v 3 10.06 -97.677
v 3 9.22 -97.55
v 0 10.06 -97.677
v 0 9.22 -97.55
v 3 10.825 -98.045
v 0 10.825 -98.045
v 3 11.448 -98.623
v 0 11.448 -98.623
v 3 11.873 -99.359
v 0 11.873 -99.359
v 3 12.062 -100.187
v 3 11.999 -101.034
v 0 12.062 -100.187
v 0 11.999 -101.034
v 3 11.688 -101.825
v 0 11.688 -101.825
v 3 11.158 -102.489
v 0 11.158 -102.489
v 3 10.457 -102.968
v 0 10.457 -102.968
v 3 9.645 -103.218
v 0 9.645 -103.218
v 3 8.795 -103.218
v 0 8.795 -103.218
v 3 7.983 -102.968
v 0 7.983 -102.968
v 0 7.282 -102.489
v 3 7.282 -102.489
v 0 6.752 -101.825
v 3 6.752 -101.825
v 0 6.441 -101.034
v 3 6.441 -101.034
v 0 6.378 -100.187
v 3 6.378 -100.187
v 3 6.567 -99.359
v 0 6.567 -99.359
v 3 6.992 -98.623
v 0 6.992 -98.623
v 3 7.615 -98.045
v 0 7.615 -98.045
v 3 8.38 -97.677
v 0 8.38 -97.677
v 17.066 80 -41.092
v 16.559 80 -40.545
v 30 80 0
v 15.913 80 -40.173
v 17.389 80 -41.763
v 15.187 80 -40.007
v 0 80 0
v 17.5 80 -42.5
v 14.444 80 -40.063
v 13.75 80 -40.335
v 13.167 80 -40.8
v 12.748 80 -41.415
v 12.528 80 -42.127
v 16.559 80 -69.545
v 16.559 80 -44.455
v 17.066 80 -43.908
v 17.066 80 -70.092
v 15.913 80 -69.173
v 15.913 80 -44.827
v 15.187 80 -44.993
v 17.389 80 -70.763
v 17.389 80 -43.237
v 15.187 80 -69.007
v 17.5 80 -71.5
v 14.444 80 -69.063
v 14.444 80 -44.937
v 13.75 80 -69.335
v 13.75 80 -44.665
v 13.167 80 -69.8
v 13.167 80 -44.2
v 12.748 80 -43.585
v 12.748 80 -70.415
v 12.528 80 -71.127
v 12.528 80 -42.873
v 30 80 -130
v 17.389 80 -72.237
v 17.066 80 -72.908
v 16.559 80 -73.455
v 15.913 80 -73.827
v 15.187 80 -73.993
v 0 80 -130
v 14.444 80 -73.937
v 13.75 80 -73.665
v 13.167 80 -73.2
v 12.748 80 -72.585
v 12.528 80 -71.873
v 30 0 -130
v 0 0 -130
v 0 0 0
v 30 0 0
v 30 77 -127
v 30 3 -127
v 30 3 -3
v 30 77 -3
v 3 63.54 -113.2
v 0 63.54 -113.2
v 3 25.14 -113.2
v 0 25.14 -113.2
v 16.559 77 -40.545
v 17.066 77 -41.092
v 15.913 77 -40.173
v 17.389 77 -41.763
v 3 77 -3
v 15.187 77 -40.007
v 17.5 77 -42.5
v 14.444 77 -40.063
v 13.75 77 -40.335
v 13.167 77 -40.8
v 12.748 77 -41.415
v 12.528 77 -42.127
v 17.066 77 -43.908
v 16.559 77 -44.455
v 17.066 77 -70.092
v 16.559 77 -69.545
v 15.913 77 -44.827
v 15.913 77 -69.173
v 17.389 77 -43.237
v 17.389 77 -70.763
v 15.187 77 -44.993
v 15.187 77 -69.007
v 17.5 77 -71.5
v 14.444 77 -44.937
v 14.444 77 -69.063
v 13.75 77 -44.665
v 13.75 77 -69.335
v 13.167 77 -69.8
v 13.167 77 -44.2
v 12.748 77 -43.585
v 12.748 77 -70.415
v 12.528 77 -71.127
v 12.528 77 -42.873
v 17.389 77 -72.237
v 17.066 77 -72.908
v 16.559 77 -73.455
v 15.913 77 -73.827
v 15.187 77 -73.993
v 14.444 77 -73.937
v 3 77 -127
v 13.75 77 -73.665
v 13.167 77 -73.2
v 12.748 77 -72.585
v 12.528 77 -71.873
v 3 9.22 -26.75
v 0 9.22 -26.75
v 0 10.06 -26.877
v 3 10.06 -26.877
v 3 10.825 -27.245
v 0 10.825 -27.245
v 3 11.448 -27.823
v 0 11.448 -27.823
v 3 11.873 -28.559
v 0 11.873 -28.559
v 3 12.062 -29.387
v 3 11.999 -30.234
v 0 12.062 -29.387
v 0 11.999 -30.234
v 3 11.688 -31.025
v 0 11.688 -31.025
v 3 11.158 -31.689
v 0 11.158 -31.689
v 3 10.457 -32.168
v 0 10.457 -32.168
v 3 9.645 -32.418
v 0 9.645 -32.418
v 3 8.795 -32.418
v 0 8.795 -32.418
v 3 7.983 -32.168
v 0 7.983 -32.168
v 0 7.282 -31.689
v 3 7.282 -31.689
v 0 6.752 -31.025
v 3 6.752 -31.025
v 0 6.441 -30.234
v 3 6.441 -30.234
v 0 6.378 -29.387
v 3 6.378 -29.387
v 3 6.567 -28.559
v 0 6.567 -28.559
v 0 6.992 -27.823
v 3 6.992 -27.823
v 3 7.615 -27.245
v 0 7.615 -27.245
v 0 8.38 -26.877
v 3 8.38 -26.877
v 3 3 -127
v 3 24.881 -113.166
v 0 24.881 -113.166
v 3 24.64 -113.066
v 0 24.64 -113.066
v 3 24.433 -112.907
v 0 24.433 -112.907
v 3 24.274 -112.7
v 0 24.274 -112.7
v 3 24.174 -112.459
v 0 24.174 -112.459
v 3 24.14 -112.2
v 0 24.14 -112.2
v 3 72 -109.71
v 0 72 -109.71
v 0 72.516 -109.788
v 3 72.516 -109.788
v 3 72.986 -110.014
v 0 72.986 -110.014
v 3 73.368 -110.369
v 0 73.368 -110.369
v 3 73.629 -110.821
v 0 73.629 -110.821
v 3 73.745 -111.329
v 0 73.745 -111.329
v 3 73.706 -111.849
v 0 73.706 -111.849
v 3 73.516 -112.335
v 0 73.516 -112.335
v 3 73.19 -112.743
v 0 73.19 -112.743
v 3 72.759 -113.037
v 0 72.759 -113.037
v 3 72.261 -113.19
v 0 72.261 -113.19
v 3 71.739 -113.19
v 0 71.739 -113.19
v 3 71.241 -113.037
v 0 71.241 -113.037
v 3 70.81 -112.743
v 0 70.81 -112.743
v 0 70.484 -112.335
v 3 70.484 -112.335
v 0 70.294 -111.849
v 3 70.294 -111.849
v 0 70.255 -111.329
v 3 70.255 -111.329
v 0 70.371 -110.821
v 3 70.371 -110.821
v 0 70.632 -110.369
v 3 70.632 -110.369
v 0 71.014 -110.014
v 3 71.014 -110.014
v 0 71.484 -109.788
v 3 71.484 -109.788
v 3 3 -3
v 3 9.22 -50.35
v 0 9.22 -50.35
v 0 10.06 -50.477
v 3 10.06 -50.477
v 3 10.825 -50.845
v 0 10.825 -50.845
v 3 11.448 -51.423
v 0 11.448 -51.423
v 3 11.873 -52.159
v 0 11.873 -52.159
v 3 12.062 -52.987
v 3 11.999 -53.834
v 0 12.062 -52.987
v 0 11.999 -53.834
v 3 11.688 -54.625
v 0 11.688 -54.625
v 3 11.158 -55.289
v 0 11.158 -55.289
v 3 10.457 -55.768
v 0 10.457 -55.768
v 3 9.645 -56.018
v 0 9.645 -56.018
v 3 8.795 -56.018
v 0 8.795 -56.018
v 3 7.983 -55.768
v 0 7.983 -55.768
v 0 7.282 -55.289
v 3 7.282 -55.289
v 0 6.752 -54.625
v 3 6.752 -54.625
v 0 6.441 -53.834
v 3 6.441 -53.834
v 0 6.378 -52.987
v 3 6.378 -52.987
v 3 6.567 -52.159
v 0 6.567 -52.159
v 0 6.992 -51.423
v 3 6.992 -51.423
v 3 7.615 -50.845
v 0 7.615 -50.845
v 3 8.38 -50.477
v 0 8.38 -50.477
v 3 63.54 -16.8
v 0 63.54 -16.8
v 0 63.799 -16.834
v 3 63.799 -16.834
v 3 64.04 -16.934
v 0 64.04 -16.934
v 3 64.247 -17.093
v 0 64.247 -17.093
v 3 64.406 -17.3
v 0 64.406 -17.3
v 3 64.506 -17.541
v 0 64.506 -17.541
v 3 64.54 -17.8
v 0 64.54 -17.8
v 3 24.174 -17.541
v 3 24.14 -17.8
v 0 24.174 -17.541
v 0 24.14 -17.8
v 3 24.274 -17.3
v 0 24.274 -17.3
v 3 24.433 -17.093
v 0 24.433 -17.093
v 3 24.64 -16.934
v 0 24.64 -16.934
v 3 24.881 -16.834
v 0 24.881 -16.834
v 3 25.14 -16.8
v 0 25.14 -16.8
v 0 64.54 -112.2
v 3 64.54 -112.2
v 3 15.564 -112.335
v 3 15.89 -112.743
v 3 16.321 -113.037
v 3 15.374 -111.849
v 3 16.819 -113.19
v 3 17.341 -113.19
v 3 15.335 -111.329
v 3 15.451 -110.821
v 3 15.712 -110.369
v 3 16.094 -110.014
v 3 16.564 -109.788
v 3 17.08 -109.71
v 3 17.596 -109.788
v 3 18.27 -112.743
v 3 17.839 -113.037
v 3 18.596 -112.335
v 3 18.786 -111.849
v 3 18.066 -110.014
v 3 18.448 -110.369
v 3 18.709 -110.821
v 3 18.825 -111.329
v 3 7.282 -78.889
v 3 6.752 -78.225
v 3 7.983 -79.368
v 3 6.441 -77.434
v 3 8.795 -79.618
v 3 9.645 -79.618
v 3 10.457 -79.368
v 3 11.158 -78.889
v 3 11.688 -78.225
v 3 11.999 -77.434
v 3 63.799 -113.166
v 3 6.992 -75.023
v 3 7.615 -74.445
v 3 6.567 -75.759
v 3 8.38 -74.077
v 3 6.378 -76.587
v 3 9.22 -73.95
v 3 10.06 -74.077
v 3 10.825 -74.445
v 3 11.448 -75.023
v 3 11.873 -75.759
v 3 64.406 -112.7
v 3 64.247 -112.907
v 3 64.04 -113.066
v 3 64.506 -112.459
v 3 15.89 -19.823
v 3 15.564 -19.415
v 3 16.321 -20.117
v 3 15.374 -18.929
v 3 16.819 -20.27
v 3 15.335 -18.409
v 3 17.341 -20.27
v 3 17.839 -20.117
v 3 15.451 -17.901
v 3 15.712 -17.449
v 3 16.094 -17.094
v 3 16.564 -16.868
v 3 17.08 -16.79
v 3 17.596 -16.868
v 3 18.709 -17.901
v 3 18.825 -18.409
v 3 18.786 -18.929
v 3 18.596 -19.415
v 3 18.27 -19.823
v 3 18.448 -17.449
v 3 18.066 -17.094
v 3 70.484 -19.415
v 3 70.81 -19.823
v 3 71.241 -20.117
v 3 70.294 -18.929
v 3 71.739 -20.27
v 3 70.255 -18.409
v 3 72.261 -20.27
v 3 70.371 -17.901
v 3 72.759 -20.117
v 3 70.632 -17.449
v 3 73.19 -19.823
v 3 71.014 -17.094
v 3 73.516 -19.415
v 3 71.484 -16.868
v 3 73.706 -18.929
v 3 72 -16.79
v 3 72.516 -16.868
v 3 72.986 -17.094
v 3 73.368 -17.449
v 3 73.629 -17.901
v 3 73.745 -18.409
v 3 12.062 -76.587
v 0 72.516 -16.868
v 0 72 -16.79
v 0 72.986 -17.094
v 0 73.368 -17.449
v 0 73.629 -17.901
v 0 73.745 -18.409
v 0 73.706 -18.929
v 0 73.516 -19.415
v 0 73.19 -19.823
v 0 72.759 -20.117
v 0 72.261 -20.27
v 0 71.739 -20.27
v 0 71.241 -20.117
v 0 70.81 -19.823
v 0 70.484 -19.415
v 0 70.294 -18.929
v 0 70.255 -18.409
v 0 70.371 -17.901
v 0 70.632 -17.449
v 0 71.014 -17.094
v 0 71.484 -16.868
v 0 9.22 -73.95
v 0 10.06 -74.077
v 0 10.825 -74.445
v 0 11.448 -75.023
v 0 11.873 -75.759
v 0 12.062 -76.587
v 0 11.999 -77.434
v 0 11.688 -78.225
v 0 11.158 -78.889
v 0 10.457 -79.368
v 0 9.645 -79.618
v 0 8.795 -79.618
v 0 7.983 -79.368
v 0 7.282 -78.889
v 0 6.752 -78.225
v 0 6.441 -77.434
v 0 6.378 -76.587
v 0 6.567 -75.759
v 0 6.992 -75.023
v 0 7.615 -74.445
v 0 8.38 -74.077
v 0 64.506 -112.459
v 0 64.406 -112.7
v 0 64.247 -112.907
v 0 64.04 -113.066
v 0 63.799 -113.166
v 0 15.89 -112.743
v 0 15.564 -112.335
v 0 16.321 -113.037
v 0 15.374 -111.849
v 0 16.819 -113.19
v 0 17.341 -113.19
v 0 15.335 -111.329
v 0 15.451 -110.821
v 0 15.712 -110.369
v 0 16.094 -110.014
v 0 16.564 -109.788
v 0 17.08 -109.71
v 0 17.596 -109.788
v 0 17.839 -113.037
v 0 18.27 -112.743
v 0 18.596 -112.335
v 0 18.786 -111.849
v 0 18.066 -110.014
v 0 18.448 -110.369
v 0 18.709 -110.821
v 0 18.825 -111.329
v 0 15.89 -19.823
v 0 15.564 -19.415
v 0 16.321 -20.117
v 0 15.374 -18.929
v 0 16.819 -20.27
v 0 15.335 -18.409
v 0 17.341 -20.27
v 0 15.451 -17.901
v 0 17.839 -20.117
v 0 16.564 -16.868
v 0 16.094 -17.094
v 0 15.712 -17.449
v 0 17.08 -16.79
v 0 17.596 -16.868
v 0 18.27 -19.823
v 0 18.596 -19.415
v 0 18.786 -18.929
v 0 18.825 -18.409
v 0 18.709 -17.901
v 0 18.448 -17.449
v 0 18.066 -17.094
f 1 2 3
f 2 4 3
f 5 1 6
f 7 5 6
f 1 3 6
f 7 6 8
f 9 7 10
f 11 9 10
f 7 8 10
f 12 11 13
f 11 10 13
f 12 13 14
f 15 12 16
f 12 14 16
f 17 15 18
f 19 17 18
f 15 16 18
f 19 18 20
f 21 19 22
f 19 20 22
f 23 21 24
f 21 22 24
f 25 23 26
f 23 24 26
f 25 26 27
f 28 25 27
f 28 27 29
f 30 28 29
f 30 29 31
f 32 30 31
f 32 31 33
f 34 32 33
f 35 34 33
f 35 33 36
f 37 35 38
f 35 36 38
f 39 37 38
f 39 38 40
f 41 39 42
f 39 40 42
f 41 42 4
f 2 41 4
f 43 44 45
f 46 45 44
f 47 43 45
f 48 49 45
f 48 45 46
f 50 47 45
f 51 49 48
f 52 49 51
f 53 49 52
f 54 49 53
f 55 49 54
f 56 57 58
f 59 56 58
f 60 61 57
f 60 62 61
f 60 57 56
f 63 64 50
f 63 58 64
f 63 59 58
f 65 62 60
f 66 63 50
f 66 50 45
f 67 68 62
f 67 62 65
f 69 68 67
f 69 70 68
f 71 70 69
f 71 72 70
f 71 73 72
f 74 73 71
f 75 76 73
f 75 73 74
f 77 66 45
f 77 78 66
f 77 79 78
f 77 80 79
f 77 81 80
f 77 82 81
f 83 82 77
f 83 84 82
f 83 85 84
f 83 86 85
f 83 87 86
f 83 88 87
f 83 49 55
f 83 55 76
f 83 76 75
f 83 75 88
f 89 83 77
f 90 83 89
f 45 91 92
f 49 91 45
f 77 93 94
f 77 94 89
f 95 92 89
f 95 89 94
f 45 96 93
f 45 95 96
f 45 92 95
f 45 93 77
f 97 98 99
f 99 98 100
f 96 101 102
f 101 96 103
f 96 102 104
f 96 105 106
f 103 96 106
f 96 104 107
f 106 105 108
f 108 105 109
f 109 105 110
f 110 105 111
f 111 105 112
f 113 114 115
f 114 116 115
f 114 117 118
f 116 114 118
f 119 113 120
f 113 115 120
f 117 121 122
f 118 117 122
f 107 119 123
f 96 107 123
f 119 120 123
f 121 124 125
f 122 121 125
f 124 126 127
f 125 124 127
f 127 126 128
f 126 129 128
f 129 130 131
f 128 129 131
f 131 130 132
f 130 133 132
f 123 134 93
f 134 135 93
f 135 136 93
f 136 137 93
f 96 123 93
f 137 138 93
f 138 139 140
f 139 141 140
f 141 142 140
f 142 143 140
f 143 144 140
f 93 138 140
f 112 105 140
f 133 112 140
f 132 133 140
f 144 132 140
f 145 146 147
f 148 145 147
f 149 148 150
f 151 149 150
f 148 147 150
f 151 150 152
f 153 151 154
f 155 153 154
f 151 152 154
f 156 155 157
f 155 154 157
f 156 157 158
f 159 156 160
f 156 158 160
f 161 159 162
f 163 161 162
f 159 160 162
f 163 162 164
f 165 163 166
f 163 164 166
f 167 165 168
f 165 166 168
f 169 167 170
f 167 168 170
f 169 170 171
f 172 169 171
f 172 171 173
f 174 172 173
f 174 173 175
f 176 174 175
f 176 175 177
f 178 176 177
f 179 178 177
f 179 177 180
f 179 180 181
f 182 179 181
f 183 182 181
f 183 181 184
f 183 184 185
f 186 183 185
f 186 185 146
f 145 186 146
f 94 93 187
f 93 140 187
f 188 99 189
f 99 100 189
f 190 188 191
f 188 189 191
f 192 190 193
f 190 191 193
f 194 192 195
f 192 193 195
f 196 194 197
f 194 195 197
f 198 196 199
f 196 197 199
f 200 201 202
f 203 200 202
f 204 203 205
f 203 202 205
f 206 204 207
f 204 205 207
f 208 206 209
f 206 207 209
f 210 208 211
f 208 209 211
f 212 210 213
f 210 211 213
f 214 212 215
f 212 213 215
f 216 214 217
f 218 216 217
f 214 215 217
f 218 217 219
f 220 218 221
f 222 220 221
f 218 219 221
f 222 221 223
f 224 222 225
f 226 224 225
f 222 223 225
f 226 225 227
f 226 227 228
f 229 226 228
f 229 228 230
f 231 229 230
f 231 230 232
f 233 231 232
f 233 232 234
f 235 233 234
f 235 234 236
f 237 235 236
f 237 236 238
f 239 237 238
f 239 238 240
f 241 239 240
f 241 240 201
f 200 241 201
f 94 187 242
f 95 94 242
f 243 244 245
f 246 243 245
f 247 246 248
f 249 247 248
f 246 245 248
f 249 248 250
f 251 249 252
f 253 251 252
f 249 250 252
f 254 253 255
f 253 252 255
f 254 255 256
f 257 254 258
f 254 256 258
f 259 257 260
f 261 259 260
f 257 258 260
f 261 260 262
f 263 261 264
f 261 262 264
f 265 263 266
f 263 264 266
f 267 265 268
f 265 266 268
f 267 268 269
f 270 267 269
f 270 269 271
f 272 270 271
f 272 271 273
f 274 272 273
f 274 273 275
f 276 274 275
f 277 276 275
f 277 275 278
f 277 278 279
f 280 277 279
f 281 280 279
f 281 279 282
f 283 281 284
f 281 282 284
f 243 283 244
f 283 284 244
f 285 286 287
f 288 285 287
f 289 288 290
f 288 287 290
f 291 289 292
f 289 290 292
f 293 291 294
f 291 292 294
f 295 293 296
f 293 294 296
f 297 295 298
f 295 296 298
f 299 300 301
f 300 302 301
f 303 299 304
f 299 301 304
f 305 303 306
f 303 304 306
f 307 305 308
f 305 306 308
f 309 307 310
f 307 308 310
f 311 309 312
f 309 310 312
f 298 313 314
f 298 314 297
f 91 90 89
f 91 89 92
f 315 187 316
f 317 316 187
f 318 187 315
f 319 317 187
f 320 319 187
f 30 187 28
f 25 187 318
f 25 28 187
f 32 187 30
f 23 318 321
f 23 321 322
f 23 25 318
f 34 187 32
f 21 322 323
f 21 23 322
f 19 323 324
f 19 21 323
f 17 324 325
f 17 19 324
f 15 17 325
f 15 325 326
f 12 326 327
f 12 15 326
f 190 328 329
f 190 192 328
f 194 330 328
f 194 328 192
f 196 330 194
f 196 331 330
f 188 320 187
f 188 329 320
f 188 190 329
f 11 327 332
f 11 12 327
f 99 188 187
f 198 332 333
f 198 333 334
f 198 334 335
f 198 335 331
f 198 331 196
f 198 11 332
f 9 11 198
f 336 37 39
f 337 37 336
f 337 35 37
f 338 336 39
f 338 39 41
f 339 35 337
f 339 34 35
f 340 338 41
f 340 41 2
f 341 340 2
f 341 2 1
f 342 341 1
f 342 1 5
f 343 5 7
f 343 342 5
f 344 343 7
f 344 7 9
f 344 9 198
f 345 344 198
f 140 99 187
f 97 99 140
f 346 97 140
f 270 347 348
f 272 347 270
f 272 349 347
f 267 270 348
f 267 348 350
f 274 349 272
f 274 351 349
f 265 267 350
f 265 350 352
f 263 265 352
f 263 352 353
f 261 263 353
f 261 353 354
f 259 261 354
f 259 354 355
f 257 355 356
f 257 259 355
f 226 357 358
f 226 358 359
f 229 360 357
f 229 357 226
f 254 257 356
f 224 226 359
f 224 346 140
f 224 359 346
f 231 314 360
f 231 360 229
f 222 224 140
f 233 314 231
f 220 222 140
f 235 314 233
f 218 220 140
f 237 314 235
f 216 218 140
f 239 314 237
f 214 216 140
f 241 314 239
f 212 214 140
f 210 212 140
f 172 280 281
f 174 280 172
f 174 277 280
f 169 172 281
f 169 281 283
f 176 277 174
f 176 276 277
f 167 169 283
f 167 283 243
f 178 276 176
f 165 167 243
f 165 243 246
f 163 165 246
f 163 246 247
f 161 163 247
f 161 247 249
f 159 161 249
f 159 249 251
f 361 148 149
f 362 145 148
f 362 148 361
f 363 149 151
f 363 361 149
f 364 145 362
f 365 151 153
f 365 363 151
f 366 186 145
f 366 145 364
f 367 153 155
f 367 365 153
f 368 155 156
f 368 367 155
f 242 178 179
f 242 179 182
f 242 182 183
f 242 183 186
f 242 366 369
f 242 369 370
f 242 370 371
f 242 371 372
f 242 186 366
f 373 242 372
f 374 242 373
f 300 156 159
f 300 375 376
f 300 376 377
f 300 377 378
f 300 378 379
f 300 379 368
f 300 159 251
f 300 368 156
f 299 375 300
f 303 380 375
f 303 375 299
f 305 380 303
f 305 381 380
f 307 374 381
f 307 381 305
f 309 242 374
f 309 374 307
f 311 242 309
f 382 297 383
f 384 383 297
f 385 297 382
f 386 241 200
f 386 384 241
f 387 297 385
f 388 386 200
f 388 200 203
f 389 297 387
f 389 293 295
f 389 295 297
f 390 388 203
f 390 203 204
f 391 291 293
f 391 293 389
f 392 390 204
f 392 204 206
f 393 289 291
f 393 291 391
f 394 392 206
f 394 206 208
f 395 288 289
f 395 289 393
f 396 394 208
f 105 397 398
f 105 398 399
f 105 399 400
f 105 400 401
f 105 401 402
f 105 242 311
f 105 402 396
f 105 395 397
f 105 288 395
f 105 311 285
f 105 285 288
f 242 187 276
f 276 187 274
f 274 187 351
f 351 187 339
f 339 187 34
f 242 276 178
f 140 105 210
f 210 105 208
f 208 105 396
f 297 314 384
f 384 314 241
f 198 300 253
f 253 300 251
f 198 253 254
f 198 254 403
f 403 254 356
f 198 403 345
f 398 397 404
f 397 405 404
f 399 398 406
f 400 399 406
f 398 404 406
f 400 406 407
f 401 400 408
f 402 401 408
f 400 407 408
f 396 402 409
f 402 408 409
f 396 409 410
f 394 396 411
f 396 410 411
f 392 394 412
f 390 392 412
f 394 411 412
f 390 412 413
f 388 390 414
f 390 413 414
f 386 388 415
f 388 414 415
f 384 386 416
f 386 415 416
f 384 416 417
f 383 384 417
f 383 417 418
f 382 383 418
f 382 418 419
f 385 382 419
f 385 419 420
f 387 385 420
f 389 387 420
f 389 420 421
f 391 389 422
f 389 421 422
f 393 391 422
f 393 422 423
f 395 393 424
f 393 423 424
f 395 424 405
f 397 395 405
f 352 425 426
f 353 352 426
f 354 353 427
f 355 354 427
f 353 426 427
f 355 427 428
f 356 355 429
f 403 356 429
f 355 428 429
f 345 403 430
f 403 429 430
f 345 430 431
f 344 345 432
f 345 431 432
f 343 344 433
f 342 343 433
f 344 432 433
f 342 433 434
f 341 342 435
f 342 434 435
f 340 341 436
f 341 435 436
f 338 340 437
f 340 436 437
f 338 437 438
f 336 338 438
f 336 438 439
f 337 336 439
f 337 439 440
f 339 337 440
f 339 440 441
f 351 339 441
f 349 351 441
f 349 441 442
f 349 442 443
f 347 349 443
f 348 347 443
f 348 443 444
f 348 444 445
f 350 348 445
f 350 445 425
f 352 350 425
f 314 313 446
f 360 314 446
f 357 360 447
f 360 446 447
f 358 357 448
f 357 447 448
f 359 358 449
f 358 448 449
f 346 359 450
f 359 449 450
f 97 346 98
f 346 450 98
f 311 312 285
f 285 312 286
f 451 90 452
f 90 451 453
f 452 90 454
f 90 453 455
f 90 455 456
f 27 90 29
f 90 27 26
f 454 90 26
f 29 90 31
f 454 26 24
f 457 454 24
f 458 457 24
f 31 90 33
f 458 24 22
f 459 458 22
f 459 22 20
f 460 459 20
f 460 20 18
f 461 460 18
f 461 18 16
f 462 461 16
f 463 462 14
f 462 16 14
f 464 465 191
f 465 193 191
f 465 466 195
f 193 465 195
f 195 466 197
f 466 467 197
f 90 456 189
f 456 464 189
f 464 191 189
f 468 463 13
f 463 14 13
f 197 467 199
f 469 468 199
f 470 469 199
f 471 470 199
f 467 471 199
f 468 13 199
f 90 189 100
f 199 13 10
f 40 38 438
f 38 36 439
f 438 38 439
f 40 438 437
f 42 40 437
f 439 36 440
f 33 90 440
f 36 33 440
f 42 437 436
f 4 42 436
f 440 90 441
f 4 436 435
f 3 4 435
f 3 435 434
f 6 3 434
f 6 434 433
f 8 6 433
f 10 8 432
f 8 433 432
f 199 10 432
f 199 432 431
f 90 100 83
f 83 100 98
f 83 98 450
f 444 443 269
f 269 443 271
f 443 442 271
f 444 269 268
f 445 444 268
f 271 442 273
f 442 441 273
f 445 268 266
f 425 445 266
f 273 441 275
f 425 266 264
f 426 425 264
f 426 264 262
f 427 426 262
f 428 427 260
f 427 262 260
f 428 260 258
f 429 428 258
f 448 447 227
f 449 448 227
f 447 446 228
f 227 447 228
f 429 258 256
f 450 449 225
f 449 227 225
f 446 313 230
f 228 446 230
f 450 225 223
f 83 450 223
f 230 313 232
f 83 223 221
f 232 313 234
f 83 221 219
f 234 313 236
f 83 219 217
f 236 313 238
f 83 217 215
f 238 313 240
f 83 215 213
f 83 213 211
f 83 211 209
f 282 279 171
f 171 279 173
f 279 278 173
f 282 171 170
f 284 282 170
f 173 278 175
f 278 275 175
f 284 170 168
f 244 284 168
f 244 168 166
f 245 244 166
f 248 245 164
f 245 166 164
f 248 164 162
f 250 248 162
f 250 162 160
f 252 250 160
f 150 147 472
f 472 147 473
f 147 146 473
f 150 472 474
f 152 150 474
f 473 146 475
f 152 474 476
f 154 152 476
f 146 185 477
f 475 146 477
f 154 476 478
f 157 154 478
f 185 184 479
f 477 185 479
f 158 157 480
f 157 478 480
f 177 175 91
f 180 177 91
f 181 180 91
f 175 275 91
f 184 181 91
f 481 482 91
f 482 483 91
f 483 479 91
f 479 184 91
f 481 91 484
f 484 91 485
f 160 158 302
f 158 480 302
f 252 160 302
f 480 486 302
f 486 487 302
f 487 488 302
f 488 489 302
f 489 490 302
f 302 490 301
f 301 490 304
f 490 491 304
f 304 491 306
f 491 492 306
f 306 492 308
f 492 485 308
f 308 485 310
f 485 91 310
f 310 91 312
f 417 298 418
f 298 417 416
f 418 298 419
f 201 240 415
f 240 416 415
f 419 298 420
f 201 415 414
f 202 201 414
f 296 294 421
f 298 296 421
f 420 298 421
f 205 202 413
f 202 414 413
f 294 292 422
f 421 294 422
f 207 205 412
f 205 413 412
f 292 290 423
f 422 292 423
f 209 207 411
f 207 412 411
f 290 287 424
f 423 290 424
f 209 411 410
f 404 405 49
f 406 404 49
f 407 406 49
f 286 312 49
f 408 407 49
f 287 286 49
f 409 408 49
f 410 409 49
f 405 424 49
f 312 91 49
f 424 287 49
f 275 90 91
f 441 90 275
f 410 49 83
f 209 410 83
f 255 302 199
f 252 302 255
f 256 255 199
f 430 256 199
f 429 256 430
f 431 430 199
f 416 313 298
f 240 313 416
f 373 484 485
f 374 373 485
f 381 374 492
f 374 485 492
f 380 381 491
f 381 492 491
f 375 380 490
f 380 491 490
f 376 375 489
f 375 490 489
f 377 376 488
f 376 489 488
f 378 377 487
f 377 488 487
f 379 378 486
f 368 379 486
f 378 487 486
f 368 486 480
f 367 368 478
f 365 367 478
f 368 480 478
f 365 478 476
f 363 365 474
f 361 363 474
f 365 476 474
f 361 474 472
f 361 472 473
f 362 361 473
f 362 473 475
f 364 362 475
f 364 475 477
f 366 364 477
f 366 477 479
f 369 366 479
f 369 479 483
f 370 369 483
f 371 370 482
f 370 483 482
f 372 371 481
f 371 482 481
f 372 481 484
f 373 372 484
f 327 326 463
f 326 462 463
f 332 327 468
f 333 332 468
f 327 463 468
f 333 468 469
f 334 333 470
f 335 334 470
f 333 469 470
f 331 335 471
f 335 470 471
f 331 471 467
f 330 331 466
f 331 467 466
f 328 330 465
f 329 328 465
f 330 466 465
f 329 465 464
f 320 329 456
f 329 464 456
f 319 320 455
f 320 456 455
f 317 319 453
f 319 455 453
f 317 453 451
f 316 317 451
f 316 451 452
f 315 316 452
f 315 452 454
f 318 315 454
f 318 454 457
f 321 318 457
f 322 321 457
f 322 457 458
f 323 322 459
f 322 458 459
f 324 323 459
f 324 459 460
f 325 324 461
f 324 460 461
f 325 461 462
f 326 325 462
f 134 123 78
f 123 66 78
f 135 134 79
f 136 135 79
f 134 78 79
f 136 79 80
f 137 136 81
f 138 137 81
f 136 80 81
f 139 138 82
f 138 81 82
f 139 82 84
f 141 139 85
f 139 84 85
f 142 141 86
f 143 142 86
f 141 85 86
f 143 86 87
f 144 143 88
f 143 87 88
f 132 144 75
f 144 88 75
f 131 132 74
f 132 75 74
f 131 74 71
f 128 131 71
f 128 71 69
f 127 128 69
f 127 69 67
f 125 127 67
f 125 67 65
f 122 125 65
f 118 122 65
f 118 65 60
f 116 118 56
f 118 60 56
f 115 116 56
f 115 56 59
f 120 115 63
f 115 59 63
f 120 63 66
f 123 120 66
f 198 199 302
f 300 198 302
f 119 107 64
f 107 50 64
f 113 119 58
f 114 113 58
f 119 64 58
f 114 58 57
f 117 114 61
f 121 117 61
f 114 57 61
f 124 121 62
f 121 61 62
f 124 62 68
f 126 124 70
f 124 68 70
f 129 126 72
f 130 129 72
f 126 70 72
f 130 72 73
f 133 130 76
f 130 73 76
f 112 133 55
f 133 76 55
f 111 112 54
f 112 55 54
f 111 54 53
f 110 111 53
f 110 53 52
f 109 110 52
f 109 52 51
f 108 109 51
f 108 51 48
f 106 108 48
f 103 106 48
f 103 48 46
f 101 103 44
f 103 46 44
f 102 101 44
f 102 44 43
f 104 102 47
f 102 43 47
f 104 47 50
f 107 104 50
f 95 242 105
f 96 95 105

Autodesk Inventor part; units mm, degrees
ref_plane "YZ Plane" through (0, 0, 0) normal (1, 0, 0) x (0, 1, 0)
ref_plane "XZ Plane" through (0, 0, 0) normal (0, 1, 0) x (-1, 0, 0)
ref_plane "XY Plane" through (0, 0, 0) normal (0, 0, 1) x (1, 0, 0)
sketch "Sketch1" plane through (0, 0, 0) normal (1, 0, 0) x (0, 1, 0)
  line L0 (0, 0) -> (80, 0)
  line L1 (80, 0) -> (80, -130)
  line L2 (80, -130) -> (0, -130)
  line L3 (0, -130) -> (0, 0)
  dimension "d0" = 130
  dimension "d1" = 80
extrude "Extrusion1" add sketch "Sketch1" along normal blind 30
shell "Shell1" thickness 3 removed faces 1 at (30, 53.3333, -43.3333)
sketch "Sketch2" plane through (0, 0, 0) normal (-1, 0, 0) x (0, 0, 1)
  line L0 (-127, 77) -> (-3, 77) projected
  line L1 (-127, 3) -> (-3, 3) projected
  line L2 (-127, 77) -> (-3, 77)
  line L3 (-3, 77) -> (-3, 3)
  line L4 (-3, 3) -> (-127, 3)
  line L5 (-127, 3) -> (-127, 77)
  line L6 (-65, 77) -> (-65, 41.725)
  line L7 (-127, 77) -> (-122, 77)
  line L8 (-122, 77) -> (-122, 72)
  line L9 (-122, 72) -> (-127, 72)
  line L10 (-127, 72) -> (-127, 77)
  line L11 (-3, 77) -> (-8, 77)
  line L12 (-8, 77) -> (-8, 72)
  line L13 (-8, 72) -> (-3, 72)
  line L14 (-3, 72) -> (-3, 77)
  circle A0 centre (-18.54, 72) radius 1.75
  circle A1 centre (-111.46, 72) radius 1.75
  line L15 (-111.46, 17.08) -> (-18.54, 17.08)
  circle A2 centre (-111.46, 17.08) radius 1.75
  circle A3 centre (-18.54, 17.08) radius 1.75
  line L16 (-111.46, 72) -> (-111.46, 64.54)
  line L17 (-65, 64.54) -> (-16.8, 64.54)
  line L18 (-17.8, 64.54) -> (-112.2, 64.54)
  line L19 (-113.2, 63.54) -> (-113.2, 25.14)
  line L20 (-112.2, 24.14) -> (-17.8, 24.14)
  line L21 (-16.8, 25.14) -> (-16.8, 63.54)
  arc A4 (-112.2, 64.54) -> (-113.2, 63.54) centre (-112.2, 63.54) ccw
  arc A5 (-113.2, 25.14) -> (-112.2, 24.14) centre (-112.2, 25.14) ccw
  arc A6 (-17.8, 24.14) -> (-16.8, 25.14) centre (-17.8, 25.14) ccw
  arc A7 (-16.8, 63.54) -> (-17.8, 64.54) centre (-17.8, 63.54) ccw
  point P0 (0, 0)
  point P1 (-113.2, 64.54)
  point P2 (-113.2, 24.14)
  dimension "d5" = 5
  dimension "d6" = 5
  dimension "d7" = 5
  dimension "d8" = 5
  dimension "d11" = 3.5
  dimension "d12" = 3.5
  dimension "d13" = 54.92
  dimension "d14" = 3.5
  dimension "d15" = 3.5
  dimension "d16" = 7.46
  dimension "d18" = 92.92
  dimension "d19" = 48.2
  dimension "d20" = 96.4
  dimension "d21" = 40.4
  dimension "d22" = 1
extrude "Extrusion2" cut sketch "Sketch2" against normal blind 30 contours A1 | L17 A7 L21 A6 L20 A5 L19 A4 L18 | A0 | A3 | A2
sketch "Sketch3" plane through (0, 0, 0) normal (-1, 0, 0) x (0, 0, 1)
  line L0 (-17.8, 24.14) -> (-112.2, 24.14) projected
  line L1 (-65, 24.14) -> (-65, 0)
  line L2 (0, 0) -> (-130, 0) projected
  line L3 (-65, 9.22) -> (-65, 12.07)
  line L4 (-65, 10.645) -> (-64.0682, 10.645)
  circle A0 centre (-53.2, 9.22) radius 2.85
  circle A1 centre (-29.6, 9.22) radius 2.85
  circle A2 centre (-76.8, 9.22) radius 2.85
  circle A3 centre (-100.4, 9.22) radius 2.85
  line L5 (-65, 12.07) -> (-65, 9.22)
  point P0 (-88.6, 12.07)
  point P1 (-88.6, 9.22)
extrude "Extrusion3" cut sketch "Sketch3" against normal blind 30
sketch "Sketch4" plane through (0, 80, 0) normal (0, 1, 0) x (1, 0, 0)
  line L0 (0, 130) -> (30, 130) projected
  circle A0 centre (15, 71.5) radius 2.5
  circle A1 centre (15, 42.5) radius 2.5
  point P0 (0, 0)
  dimension "d30" = 5
extrude "Extrusion4" cut sketch "Sketch4" against normal blind 4
properties part number "cover lcd"
